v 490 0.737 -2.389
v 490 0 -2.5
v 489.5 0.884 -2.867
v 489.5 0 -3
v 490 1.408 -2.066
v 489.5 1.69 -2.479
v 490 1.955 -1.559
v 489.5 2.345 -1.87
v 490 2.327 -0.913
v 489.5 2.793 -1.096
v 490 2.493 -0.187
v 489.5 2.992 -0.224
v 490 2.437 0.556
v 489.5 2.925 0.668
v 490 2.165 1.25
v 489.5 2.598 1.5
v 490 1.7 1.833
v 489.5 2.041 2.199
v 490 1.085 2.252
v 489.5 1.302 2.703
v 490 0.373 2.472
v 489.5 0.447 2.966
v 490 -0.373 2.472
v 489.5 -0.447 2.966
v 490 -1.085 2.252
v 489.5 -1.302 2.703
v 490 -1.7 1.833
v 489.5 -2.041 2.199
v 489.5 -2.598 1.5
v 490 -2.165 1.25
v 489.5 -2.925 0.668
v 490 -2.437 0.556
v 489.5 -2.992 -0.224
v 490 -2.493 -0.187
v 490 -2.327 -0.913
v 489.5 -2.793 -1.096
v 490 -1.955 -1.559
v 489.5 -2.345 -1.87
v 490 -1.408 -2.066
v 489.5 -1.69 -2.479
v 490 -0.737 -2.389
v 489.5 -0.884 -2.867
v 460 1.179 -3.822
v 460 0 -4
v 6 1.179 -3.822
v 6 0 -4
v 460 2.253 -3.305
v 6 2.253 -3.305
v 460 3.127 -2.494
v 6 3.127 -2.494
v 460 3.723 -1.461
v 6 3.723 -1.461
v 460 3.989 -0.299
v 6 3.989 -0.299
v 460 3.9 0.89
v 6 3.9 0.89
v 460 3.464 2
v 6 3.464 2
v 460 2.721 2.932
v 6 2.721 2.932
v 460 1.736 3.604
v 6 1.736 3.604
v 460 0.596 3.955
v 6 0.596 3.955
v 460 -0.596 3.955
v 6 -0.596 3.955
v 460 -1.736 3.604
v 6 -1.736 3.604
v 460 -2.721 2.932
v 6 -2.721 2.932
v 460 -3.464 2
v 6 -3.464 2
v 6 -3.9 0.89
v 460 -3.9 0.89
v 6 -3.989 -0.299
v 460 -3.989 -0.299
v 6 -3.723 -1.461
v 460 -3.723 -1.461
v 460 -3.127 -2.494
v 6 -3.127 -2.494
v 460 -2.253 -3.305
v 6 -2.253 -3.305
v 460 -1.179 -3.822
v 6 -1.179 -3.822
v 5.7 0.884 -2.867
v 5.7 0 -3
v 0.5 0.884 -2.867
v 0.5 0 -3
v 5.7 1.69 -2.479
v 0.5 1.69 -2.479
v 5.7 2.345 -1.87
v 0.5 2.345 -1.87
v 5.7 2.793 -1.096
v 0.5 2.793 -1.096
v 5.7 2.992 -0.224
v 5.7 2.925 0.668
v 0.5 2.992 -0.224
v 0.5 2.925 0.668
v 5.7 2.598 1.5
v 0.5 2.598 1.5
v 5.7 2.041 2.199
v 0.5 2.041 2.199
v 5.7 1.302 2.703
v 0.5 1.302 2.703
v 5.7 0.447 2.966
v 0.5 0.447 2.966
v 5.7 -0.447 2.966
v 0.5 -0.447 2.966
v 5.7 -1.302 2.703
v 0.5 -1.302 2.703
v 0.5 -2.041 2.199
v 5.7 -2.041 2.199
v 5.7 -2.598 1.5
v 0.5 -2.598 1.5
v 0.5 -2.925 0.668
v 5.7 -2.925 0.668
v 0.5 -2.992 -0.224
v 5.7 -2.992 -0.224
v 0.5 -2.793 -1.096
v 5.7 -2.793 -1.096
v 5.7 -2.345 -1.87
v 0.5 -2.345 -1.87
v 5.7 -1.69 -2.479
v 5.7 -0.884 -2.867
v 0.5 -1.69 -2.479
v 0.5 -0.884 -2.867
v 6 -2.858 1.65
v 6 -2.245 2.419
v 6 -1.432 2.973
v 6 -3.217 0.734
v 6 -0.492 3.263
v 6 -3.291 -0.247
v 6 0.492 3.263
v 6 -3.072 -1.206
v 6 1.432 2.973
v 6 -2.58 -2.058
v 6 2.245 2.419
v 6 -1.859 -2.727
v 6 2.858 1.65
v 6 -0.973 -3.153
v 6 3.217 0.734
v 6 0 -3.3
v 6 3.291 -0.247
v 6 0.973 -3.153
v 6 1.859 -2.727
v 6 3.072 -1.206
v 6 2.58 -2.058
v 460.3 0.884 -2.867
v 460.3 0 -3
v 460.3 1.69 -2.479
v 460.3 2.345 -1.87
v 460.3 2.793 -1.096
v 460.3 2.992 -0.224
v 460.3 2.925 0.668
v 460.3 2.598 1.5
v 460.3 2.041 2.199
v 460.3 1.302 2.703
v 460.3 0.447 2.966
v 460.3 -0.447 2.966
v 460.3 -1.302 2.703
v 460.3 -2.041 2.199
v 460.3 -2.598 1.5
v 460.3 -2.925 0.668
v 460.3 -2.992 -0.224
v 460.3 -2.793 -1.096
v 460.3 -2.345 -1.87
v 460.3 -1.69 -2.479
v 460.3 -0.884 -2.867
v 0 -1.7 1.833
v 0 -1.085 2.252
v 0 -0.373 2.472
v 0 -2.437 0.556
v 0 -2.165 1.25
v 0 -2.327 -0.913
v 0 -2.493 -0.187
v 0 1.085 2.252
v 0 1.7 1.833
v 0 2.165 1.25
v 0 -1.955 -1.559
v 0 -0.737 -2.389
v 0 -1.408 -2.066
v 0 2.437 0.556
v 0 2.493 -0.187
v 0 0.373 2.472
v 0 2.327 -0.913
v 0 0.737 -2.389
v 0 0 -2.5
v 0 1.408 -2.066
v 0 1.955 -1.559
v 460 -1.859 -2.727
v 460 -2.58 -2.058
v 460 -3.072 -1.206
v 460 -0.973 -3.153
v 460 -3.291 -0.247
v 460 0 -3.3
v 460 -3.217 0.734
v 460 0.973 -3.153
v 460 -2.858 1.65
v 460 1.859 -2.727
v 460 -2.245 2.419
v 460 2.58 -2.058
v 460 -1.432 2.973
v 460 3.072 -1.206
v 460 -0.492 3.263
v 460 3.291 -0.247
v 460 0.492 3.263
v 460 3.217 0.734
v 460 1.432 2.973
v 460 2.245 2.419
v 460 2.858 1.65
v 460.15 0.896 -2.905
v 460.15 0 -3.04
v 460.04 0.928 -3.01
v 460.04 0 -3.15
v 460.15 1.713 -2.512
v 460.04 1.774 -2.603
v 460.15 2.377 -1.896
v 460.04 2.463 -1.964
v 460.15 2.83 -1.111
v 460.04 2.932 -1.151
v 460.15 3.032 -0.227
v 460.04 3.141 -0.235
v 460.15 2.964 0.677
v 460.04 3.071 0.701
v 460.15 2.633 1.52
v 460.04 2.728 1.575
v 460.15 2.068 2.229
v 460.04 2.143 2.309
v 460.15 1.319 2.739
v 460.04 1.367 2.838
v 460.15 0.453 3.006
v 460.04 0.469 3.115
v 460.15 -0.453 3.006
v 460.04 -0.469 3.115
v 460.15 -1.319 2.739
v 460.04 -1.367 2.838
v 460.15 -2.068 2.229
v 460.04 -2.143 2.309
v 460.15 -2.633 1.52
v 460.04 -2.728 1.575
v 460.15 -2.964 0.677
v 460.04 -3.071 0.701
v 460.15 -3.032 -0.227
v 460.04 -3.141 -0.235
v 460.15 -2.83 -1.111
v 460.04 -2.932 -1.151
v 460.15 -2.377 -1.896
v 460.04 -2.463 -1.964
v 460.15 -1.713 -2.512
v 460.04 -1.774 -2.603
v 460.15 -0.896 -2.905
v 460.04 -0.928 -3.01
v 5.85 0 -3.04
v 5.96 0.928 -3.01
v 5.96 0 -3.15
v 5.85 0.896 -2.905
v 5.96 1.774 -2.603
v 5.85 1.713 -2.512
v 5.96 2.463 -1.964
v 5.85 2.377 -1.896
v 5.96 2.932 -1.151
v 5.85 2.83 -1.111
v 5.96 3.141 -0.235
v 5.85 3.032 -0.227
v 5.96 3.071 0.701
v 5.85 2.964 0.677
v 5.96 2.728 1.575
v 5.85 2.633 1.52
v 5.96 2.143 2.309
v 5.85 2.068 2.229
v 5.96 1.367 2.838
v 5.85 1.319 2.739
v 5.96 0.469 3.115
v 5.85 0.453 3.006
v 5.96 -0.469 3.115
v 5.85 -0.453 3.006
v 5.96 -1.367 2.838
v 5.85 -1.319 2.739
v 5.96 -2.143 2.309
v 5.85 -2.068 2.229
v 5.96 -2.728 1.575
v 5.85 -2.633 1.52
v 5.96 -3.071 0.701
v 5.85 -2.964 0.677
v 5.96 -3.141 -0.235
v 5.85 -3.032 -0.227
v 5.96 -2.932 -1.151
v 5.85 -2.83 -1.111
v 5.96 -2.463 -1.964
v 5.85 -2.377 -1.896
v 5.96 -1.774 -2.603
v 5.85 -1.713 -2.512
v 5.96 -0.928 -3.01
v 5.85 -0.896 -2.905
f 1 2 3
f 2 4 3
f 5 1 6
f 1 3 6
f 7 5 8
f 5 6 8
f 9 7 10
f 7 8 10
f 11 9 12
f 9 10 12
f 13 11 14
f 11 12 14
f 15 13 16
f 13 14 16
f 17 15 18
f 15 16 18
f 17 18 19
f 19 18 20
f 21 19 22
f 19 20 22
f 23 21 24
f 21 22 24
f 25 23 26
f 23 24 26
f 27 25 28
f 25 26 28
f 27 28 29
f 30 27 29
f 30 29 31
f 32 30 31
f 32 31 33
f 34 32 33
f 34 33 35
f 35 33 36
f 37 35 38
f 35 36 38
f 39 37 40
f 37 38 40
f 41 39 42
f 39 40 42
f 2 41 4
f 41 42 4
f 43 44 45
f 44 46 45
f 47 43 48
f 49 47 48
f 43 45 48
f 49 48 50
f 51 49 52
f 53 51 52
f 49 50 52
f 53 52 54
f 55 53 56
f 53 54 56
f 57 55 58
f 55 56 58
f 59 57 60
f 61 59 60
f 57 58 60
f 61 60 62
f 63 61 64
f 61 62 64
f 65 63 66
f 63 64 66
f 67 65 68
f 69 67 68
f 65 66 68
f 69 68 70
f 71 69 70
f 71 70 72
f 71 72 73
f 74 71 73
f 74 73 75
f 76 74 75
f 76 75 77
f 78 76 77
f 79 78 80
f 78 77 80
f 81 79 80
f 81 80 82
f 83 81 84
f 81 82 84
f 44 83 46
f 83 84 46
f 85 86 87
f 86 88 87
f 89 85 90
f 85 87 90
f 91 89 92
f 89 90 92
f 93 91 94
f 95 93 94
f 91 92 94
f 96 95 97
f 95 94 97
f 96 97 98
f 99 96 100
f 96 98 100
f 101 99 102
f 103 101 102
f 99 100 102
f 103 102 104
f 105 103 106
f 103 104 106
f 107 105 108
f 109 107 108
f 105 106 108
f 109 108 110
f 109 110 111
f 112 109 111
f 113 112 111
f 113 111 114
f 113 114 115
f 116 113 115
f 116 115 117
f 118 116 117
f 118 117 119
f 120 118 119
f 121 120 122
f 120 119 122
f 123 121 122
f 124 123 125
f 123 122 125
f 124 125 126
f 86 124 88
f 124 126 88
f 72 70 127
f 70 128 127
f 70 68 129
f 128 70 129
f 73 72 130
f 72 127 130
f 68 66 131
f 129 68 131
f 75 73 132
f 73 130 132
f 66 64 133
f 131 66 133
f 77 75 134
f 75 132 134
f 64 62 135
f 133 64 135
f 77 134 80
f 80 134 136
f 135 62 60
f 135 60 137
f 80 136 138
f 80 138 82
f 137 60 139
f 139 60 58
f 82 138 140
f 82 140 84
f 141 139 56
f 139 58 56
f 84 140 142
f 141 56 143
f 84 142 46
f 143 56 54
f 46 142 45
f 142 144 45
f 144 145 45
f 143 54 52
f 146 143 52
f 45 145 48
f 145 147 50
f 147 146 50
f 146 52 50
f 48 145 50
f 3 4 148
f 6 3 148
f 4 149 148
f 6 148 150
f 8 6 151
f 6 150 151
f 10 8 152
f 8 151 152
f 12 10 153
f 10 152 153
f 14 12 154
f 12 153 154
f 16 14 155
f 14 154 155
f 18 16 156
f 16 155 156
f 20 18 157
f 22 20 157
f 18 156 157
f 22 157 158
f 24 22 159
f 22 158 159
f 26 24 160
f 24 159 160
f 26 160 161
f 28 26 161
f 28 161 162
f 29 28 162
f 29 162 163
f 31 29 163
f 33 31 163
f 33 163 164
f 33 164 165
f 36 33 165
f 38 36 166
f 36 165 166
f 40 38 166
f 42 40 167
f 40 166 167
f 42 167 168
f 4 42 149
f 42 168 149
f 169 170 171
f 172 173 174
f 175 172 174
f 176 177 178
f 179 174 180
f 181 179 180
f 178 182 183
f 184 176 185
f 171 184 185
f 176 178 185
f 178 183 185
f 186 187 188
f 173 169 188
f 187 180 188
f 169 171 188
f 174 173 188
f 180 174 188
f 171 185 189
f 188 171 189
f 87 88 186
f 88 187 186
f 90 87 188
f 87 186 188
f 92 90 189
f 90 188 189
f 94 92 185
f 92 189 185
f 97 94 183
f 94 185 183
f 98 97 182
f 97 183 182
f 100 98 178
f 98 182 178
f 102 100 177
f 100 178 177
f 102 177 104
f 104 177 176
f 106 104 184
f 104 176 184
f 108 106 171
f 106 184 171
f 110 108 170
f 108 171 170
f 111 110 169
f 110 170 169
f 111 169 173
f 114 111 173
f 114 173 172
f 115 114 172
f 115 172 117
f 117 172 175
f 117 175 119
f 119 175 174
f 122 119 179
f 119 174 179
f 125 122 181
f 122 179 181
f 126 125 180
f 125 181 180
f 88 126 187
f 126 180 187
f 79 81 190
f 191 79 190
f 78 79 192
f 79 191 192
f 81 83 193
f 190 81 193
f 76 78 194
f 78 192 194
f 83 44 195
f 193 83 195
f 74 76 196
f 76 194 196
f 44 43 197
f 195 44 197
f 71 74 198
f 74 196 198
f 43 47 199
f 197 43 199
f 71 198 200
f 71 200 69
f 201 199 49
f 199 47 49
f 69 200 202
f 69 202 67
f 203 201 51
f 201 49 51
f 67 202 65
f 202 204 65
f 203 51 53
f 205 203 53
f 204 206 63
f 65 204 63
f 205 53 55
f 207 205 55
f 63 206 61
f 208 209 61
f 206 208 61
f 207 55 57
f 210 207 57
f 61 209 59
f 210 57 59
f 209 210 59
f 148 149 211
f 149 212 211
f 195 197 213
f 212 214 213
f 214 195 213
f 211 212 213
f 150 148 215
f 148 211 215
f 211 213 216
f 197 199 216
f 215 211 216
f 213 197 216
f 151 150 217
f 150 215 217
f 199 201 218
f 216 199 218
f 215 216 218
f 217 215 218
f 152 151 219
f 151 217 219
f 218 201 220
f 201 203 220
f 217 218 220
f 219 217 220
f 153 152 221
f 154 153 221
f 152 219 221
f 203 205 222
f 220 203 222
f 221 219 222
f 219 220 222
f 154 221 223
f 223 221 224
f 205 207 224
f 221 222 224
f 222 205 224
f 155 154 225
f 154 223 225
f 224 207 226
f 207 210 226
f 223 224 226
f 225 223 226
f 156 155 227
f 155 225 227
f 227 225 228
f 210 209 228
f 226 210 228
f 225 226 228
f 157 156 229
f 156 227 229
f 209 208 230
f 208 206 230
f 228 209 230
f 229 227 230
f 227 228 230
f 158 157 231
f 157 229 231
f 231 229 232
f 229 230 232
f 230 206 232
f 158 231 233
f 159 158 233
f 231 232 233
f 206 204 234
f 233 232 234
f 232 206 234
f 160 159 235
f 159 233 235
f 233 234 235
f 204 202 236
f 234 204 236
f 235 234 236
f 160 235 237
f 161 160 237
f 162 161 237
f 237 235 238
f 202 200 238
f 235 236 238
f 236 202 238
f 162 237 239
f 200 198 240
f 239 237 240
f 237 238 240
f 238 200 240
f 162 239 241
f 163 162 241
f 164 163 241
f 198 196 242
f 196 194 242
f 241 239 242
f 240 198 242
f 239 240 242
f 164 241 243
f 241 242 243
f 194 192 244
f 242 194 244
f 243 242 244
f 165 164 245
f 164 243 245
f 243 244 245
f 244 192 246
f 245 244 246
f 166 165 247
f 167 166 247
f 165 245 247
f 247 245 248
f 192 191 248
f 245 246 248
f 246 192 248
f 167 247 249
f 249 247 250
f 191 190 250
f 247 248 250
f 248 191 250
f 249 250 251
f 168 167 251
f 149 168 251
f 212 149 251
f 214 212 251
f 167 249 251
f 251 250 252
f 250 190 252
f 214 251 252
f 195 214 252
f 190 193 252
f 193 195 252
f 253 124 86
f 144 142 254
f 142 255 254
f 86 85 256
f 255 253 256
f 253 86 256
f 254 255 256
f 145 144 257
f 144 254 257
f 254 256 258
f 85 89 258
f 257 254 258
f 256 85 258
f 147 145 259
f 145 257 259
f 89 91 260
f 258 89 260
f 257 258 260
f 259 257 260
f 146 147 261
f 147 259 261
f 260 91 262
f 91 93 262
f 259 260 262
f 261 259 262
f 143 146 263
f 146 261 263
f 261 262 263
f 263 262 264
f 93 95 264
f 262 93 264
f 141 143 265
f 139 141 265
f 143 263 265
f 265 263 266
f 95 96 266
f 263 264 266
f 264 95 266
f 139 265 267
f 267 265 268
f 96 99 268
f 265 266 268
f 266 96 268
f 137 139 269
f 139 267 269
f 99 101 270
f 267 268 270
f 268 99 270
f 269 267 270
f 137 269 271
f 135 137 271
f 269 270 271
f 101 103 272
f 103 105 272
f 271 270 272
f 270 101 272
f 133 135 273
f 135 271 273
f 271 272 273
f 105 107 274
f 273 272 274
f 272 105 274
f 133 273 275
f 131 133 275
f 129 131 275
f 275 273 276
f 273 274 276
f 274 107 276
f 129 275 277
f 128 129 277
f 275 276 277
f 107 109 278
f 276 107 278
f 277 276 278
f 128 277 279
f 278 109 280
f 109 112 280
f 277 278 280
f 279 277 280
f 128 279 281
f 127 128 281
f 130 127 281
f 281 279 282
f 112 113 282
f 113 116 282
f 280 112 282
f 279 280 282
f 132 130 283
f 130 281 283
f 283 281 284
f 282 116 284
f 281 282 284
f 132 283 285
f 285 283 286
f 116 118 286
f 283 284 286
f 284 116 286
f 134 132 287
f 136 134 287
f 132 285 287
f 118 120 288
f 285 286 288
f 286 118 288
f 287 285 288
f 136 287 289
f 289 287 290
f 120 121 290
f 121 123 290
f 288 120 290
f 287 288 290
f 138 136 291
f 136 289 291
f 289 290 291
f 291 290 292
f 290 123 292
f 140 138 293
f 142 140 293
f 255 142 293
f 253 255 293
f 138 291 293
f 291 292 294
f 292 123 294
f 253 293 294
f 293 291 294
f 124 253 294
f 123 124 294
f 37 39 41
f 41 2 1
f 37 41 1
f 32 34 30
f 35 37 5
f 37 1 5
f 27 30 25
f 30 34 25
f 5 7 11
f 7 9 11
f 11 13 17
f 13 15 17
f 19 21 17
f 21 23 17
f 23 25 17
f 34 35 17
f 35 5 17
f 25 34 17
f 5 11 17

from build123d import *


with BuildPart() as part:
    # Sketch1 → Revolve1 (revolve)
    with BuildSketch(Plane.XY, mode=Mode.PRIVATE) as revolve1_sk:
        with BuildLine():
            Line((0, 2.5), (0, 0))
            Line((0, 0), (490, 0))
            Line((490, 0), (490, 2.5))
            Line((490, 2.5), (489.5, 3))
            Line((489.5, 3), (460.3, 3))
            ThreePointArc((460.3, 3), (460.087867966, 3.087867966), (460, 3.3))
            Line((460, 3.3), (460, 4))
            Line((460, 4), (6, 4))
            Line((6, 4), (6, 3.3))
            ThreePointArc((6, 3.3), (5.912132034, 3.087867966), (5.7, 3))
            Line((5.7, 3), (0.5, 3))
            Line((0.5, 3), (0, 2.5))
        make_face()
    revolve(revolve1_sk.sketch.rotate(Axis((0, 0, 0), (1, 0, 0)), 270), axis=Axis((0, 0, 0), (1, 0, 0)))


solid = part.part
